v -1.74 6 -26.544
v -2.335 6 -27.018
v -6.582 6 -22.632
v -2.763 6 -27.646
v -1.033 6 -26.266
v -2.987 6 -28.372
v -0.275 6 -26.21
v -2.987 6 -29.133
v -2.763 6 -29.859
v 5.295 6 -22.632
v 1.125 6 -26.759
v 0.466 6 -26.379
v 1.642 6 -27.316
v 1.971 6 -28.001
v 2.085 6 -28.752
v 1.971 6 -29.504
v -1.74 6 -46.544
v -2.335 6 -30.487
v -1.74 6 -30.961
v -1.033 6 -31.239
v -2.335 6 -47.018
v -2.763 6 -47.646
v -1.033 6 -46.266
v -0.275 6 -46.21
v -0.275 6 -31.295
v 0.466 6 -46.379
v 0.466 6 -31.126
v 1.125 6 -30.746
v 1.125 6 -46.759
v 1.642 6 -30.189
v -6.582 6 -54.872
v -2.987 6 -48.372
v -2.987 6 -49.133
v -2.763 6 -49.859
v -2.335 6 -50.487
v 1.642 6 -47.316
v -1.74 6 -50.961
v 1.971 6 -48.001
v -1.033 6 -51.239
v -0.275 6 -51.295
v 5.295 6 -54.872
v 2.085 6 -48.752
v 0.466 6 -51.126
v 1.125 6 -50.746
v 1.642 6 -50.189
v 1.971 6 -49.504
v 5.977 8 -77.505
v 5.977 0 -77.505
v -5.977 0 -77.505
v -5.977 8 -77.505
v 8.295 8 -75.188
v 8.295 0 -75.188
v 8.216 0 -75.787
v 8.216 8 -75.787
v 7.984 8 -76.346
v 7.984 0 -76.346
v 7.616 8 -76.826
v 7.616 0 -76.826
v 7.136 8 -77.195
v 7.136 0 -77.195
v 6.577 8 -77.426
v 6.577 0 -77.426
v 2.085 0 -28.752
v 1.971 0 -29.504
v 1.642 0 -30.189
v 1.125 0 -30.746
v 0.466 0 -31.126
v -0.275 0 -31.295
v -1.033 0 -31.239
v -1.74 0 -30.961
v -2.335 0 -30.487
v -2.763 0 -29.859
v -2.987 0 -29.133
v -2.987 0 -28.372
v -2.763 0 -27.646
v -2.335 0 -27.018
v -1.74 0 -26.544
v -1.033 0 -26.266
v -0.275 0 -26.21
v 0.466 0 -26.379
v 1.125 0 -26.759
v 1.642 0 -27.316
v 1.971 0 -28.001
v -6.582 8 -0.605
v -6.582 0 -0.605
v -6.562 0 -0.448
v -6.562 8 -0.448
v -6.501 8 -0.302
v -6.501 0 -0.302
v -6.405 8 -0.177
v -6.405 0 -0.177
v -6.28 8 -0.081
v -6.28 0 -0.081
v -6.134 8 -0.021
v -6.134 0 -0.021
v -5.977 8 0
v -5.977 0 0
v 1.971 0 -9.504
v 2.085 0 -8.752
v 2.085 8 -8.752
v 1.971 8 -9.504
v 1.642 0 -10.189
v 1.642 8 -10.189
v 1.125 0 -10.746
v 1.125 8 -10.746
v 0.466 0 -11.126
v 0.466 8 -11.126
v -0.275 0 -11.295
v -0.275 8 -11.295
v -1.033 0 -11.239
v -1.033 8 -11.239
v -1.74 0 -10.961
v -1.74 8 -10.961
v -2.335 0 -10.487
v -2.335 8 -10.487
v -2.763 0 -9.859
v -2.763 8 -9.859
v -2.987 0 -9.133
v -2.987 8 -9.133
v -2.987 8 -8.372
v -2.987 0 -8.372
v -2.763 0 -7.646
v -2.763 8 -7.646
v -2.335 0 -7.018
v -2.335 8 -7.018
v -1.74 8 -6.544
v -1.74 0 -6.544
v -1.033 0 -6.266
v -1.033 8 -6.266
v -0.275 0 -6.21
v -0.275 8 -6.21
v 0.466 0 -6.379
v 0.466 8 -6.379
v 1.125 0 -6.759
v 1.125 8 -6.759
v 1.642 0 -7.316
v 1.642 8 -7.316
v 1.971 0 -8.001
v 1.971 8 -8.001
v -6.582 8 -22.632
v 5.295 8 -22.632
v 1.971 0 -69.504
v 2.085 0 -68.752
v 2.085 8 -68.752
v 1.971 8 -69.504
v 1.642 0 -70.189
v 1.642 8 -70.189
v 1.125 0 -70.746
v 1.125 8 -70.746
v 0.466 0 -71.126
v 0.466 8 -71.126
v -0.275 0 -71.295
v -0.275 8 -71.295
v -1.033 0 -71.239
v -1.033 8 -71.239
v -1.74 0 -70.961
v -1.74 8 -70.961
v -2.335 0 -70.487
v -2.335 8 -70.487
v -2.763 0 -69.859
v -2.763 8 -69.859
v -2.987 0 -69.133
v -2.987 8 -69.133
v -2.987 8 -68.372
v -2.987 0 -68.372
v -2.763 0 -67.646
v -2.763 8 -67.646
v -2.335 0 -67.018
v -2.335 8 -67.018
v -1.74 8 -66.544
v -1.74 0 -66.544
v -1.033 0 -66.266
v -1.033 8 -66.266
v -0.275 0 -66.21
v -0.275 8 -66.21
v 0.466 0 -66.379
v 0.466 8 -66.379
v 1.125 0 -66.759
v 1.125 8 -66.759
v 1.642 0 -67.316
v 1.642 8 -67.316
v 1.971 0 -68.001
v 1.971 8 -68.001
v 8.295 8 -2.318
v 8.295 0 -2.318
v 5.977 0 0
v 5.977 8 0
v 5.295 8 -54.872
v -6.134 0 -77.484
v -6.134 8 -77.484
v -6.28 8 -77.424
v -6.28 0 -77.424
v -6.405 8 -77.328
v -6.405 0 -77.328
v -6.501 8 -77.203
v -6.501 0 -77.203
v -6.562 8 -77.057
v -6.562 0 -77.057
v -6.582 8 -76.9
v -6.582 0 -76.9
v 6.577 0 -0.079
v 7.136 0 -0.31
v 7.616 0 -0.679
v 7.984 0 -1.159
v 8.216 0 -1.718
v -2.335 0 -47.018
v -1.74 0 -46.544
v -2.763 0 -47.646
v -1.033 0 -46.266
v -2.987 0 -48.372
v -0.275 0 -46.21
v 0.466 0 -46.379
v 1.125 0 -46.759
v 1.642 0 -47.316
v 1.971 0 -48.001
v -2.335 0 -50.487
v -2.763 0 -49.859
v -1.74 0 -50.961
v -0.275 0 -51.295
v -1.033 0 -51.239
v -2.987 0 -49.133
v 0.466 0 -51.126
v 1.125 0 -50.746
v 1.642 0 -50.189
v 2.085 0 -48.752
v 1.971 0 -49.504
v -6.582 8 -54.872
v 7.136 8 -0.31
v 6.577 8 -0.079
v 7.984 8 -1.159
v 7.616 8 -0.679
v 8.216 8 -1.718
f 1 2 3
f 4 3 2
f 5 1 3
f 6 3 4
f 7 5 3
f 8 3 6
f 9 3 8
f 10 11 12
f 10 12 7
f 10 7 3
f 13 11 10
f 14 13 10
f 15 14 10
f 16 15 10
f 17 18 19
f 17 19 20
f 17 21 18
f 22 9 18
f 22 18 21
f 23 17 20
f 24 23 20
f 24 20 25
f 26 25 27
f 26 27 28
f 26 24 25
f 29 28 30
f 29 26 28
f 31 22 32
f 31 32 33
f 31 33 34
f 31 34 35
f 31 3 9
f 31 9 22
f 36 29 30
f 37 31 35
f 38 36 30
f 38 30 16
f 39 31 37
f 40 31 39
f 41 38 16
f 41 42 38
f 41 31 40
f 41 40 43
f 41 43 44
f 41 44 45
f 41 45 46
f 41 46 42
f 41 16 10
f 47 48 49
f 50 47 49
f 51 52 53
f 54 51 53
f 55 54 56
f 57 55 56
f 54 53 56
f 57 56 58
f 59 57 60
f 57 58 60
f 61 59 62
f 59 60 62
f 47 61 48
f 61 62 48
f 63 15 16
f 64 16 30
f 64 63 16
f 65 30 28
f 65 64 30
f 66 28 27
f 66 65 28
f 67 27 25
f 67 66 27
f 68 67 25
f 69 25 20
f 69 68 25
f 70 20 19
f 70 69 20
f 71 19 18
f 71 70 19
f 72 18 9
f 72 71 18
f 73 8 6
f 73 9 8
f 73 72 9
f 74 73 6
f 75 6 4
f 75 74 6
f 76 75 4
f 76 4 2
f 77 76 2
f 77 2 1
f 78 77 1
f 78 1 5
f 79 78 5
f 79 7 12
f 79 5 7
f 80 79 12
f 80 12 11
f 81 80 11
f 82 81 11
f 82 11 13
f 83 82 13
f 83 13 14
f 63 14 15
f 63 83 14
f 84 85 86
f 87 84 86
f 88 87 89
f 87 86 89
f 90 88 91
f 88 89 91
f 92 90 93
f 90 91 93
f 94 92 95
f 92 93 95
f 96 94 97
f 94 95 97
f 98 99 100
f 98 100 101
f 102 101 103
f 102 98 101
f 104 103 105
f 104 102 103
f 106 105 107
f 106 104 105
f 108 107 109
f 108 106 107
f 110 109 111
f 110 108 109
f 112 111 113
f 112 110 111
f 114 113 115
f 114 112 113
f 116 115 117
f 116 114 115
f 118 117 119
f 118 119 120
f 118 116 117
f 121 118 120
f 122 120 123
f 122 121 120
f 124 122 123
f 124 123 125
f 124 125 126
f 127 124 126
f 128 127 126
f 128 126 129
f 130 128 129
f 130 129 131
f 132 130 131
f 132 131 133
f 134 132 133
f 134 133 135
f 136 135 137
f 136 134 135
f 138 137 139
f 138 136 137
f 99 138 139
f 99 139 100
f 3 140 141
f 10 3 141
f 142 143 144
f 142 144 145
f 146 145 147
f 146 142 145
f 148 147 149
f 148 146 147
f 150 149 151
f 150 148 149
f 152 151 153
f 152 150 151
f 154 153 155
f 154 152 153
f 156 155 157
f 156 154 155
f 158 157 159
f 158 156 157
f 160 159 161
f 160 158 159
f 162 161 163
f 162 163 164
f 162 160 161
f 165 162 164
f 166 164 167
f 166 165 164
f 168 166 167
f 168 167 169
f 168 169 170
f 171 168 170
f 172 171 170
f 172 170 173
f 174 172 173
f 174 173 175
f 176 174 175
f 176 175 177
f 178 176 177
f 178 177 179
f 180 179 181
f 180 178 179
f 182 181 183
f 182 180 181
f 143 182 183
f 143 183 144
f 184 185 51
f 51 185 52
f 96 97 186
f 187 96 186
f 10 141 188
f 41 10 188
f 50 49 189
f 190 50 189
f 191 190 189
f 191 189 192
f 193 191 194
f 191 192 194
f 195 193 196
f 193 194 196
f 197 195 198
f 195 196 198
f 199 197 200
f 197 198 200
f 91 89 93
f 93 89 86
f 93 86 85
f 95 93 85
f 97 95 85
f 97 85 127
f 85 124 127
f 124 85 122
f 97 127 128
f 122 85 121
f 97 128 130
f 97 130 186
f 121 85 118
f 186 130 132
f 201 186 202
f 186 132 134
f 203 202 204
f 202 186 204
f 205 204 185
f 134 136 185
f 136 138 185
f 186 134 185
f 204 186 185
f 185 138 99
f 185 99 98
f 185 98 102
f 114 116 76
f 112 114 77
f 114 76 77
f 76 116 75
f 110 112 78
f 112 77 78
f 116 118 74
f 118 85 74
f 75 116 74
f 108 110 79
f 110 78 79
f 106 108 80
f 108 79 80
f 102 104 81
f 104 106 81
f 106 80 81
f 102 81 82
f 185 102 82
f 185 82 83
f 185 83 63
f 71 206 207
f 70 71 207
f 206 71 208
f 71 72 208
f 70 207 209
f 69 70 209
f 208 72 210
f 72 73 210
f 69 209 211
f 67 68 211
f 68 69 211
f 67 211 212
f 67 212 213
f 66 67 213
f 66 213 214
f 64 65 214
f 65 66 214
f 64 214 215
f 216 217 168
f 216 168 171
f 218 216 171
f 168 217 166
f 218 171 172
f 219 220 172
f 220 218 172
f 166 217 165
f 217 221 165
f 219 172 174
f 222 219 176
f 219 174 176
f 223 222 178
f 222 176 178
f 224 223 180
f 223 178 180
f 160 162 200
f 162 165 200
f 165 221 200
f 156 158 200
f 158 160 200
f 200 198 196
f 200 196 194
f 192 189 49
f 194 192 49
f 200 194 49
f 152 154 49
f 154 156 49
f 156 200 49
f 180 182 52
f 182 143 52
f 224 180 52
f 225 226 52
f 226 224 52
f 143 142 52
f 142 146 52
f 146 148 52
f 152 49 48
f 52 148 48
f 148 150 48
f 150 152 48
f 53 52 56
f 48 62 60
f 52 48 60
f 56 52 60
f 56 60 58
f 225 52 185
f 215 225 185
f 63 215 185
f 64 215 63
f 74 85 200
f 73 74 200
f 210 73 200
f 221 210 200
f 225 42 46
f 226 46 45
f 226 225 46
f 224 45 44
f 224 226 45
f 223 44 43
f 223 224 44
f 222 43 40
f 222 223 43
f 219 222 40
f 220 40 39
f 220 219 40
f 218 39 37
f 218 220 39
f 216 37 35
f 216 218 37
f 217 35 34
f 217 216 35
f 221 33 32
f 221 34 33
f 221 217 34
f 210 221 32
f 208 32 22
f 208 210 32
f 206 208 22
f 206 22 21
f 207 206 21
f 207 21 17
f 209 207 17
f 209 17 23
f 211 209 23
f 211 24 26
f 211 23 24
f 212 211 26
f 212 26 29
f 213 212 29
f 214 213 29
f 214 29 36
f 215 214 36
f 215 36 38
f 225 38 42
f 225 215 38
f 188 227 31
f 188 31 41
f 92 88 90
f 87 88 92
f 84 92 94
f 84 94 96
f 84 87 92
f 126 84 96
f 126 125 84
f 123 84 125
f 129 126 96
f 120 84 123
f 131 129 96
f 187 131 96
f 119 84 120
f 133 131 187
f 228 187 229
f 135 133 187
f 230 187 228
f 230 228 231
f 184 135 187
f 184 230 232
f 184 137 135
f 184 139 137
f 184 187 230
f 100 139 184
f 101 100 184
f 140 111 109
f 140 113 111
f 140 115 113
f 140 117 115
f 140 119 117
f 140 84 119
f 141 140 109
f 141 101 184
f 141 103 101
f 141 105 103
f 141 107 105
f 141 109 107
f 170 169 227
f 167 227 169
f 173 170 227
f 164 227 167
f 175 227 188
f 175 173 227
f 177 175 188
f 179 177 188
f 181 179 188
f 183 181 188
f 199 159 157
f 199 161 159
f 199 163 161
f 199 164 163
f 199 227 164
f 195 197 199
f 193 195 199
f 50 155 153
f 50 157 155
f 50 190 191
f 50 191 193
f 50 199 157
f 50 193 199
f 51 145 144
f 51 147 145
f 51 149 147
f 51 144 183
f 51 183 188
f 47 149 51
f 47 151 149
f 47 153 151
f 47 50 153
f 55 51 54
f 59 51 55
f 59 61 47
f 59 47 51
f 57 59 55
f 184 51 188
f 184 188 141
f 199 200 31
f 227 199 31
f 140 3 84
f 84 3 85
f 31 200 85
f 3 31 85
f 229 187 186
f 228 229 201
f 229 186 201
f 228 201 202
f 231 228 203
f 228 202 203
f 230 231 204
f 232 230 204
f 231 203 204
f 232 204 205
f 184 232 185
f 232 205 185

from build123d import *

# Parameters (mm, degrees)
SKETCH1_R           = 2.55
BOSS_EXTRUDE1_DEPTH = 8
SKETCH2_W           = 11.877
SKETCH2_H           = 32.24
CUT_EXTRUDE1_DEPTH  = 2


with BuildPart() as part:
    # Sketch1 → Boss-Extrude1 (new body)
    with BuildSketch(Plane(origin=(0, 0, 0), x_dir=(1, 0, 0), z_dir=(0, 1, 0))):
        with BuildLine():
            Line((-5.97725, 0), (5.97725, 0))
            ThreePointArc((5.97725, 0), (7.615969965, 0.678780035), (8.29475, 2.3175))
            Line((8.29475, 2.3175), (8.29475, 75.1875))
            ThreePointArc((8.29475, 75.1875), (7.615969965, 76.826219965), (5.97725, 77.505))
            Line((5.97725, 77.505), (-5.97725, 77.505))
            ThreePointArc((-5.97725, 77.505), (-6.405049603, 77.327799603), (-6.58225, 76.9))
            Line((-6.58225, 76.9), (-6.58225, 0.605))
            ThreePointArc((-6.58225, 0.605), (-6.405049603, 0.177200397), (-5.97725, 0))
        make_face()
        with Locations((-0.46525, 68.7525)):
            Circle(SKETCH1_R, mode=Mode.SUBTRACT)
        with Locations((-0.46525, 48.7525)):
            Circle(SKETCH1_R, mode=Mode.SUBTRACT)
        with Locations((-0.46525, 8.7525)):
            Circle(SKETCH1_R, mode=Mode.SUBTRACT)
        with Locations((-0.46525, 28.7525)):
            Circle(SKETCH1_R, mode=Mode.SUBTRACT)
    extrude(amount=BOSS_EXTRUDE1_DEPTH)

    # Sketch2 → Cut-Extrude1 (cut)
    with BuildSketch(Plane(origin=(0, 8, 0), x_dir=(1, 0, 0), z_dir=(0, 1, 0))):
        with Locations((-0.64375, 38.7525)):
            Rectangle(SKETCH2_W, SKETCH2_H)
    extrude(amount=-CUT_EXTRUDE1_DEPTH, mode=Mode.SUBTRACT)


solid = part.part
